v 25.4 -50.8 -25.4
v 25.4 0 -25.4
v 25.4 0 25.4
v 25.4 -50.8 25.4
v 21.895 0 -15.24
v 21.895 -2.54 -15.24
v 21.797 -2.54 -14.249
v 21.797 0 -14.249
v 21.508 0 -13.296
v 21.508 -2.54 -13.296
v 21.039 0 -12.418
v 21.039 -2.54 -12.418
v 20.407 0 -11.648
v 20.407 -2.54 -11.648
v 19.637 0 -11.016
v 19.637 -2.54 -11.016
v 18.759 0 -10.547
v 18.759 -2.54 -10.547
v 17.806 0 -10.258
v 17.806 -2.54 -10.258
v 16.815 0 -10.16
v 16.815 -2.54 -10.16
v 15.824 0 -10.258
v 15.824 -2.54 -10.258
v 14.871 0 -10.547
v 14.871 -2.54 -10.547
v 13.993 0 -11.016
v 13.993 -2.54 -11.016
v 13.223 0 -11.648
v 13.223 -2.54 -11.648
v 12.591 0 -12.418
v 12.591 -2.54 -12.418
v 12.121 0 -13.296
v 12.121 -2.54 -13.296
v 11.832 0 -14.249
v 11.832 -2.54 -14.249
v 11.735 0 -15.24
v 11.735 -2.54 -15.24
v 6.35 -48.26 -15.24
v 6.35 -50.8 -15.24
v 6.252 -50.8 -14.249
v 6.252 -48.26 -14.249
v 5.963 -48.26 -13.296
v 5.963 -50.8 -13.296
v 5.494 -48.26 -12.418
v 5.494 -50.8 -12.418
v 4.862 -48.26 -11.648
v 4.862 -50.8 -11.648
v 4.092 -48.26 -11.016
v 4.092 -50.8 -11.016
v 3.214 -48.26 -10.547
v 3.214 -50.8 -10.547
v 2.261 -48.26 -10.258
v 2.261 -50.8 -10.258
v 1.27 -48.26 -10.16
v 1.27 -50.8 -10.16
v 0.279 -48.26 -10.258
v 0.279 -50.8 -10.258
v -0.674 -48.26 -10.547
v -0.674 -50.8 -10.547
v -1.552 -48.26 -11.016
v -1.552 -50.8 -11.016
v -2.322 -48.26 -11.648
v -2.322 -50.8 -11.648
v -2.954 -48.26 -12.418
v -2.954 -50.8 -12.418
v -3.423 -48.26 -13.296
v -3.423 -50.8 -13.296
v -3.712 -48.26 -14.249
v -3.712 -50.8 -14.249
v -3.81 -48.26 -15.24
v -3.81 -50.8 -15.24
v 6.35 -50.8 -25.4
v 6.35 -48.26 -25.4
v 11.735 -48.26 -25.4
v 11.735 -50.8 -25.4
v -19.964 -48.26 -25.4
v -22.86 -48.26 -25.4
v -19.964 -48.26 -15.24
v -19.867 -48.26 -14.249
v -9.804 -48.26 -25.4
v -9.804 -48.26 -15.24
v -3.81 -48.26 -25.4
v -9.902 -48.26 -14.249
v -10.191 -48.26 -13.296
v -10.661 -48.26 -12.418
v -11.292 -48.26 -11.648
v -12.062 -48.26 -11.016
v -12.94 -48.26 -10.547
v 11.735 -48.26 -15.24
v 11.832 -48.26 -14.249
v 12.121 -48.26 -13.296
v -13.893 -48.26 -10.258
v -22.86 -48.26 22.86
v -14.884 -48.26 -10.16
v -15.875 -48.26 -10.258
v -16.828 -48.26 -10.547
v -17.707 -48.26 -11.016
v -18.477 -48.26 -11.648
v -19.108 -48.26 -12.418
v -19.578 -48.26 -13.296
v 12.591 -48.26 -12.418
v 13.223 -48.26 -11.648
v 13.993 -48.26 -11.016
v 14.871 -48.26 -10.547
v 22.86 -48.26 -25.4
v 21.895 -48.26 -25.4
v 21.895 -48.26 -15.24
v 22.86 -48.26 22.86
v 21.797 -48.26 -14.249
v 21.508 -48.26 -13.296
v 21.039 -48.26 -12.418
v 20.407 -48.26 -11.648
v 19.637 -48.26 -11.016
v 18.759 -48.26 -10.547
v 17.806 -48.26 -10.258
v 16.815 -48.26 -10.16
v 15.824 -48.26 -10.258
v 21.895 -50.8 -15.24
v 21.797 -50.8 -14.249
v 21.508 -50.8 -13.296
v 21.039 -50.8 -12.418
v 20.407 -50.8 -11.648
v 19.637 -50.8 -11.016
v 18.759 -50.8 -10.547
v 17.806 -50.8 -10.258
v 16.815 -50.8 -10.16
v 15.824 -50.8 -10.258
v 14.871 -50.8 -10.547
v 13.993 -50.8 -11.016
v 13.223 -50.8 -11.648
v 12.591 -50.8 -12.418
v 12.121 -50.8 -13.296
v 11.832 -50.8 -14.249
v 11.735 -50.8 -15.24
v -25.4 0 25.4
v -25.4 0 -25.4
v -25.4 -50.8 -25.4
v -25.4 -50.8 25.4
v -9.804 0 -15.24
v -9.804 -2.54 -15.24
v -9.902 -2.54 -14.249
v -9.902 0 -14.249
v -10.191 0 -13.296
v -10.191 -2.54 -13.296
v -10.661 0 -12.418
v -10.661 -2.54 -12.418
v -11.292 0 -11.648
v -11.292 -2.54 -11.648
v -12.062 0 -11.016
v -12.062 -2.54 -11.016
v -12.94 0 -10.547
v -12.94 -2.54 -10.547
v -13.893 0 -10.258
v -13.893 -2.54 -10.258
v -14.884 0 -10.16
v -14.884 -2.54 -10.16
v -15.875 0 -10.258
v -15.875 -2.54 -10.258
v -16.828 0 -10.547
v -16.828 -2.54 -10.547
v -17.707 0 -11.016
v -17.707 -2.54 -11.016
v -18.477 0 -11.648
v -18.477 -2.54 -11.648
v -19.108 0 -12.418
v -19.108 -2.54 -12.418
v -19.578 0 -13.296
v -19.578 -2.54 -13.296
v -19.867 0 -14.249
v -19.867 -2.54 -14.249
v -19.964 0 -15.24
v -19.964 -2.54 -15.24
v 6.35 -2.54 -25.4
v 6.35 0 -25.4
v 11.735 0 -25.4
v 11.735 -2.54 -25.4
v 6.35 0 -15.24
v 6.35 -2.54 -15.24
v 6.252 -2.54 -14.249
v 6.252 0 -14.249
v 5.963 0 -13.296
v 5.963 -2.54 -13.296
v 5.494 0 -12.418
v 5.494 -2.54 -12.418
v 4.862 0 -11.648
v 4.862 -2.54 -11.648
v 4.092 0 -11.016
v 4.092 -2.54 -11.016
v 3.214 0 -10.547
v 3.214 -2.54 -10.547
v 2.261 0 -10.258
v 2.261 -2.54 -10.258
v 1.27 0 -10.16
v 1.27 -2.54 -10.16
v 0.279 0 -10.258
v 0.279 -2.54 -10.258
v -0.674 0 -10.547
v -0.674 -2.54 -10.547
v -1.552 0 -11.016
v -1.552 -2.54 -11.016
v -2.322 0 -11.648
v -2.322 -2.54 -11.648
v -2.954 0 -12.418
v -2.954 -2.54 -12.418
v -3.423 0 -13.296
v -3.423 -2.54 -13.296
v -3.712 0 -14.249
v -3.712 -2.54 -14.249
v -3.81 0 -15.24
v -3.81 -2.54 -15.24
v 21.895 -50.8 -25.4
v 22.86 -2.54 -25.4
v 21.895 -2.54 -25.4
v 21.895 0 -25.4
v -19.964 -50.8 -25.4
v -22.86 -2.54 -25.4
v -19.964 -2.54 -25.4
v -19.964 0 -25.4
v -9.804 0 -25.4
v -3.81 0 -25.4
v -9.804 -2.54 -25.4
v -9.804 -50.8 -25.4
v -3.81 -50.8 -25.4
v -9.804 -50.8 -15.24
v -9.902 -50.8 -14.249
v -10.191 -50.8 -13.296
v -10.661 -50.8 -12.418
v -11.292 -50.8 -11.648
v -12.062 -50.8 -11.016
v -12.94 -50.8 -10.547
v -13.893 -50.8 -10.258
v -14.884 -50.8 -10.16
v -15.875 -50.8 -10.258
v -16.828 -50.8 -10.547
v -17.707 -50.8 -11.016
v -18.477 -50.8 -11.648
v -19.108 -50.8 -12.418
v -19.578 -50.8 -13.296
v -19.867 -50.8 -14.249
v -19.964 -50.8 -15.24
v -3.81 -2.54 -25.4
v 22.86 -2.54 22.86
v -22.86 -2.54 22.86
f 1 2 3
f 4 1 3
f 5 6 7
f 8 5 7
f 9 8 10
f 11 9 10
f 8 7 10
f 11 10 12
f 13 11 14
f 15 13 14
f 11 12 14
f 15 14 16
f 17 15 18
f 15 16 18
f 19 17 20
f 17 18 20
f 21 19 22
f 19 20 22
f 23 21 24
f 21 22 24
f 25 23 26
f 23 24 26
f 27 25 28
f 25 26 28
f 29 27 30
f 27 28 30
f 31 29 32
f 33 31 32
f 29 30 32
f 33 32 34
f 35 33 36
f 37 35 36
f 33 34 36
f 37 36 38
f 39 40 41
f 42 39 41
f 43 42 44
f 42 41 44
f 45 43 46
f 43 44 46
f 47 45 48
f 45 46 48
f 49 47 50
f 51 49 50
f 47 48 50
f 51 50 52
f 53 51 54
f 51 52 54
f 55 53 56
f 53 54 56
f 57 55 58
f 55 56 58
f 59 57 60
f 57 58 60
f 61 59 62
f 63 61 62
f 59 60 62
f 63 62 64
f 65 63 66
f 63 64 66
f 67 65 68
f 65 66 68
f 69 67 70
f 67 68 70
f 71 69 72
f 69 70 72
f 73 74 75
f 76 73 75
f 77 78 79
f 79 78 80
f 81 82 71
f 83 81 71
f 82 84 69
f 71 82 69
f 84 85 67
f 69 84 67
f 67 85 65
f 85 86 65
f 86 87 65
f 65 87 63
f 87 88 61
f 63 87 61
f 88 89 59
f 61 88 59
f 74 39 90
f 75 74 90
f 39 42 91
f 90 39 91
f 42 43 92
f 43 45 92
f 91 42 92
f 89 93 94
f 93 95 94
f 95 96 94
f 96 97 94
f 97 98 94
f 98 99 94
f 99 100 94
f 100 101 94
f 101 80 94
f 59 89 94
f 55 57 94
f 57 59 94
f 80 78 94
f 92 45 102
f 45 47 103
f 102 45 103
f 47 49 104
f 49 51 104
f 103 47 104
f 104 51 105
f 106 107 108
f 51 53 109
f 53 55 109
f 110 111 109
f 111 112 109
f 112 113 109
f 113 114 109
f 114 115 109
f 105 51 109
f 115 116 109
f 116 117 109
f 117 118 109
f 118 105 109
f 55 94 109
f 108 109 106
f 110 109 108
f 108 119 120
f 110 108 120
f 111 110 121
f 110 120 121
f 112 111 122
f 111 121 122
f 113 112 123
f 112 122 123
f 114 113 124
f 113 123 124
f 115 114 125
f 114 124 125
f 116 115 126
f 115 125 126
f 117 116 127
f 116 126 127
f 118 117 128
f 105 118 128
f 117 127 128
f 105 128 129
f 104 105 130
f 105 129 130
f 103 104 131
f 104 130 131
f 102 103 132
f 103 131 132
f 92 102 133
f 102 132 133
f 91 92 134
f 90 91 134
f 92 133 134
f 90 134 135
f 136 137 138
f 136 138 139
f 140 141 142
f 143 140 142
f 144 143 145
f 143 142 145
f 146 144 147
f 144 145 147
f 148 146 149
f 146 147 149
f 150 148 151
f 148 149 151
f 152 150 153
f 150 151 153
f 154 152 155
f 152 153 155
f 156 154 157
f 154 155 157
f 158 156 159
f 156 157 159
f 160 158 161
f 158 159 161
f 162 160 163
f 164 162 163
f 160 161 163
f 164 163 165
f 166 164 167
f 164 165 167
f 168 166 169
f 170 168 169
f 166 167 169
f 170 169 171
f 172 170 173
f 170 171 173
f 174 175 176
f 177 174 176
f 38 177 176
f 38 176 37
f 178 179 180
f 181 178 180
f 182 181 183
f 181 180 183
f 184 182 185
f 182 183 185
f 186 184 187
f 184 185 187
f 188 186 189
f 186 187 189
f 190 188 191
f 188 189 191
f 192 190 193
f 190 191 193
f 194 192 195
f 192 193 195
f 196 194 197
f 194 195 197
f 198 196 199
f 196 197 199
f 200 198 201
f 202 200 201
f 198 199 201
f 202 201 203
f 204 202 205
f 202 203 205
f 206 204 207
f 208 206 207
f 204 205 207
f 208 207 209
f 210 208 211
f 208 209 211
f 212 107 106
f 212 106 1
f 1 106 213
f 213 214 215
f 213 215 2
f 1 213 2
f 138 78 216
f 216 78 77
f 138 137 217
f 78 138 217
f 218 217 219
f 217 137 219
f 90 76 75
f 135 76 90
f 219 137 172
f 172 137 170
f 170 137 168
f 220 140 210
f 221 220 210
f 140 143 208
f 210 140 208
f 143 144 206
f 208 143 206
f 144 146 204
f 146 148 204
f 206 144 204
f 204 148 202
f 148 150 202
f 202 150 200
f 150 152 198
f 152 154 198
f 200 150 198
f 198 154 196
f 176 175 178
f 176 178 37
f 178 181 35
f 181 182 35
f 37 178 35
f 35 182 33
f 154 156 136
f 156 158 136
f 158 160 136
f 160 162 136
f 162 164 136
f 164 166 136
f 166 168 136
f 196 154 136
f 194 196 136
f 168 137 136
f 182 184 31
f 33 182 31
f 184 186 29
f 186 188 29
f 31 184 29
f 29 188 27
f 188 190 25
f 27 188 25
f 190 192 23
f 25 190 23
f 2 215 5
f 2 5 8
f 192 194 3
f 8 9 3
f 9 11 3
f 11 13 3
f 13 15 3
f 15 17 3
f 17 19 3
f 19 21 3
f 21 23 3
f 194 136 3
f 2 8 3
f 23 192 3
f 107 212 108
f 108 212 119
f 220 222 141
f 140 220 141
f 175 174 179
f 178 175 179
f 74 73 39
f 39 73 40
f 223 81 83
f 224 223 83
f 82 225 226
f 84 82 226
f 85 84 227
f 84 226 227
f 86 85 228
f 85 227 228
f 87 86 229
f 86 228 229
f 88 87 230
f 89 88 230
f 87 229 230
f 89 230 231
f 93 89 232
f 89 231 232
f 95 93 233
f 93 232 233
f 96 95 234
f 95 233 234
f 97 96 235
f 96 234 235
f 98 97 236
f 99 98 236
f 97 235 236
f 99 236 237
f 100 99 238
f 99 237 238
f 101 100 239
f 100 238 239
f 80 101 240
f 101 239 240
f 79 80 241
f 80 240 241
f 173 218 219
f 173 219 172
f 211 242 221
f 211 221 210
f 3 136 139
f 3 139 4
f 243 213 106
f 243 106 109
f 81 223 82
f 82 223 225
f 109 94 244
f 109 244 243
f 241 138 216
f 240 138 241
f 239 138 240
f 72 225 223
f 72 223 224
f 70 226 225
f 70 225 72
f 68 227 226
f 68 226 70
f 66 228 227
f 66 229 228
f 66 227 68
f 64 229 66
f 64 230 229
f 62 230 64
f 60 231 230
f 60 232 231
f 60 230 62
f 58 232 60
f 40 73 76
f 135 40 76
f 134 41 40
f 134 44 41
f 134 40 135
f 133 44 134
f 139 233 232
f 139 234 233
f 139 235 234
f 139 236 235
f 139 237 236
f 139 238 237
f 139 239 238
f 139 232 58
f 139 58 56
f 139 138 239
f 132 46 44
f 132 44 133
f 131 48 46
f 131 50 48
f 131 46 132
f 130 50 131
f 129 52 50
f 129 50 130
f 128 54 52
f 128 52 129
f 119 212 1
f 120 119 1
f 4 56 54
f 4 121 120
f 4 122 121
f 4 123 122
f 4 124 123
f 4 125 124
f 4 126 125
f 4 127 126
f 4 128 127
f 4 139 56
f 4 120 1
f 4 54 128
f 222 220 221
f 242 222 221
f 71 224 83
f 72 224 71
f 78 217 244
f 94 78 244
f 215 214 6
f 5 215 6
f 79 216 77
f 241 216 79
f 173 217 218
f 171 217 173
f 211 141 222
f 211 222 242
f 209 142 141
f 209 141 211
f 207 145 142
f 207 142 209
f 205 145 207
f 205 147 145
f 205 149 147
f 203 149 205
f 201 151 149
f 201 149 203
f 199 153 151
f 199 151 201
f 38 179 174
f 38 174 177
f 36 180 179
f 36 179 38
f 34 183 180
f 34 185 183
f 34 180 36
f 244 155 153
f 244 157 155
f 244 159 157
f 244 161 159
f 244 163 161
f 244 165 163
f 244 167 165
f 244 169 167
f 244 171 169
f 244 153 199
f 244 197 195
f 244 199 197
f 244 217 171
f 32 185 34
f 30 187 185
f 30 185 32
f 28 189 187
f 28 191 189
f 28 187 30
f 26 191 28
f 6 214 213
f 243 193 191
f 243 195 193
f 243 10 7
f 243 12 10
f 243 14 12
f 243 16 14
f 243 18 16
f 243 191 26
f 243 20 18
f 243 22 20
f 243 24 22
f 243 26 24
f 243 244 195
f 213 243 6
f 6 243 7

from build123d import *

# Parameters (mm, degrees)
F0_W     = 50.8
F0_H     = 50.8
F1_DEPTH = 50.8
F2_T     = -2.54
F3_W     = 10.16
F3_H     = 10.16
F4_DEPTH = 50.8


with BuildPart() as f1:
    # F0 (on Front) → F1 (new body)
    with BuildSketch(Plane.XZ):
        Rectangle(F0_W, F0_H)
    extrude(amount=F1_DEPTH)

    # F2
    f2_openings = [f1.faces().sort_by_distance(p)[0] for p in [
        (0, -25.4, -25.4),
    ]]
    offset(amount=F2_T, openings=f2_openings)

    # F3 (on face) → F4 (cut)
    with BuildSketch(Plane.XZ.offset(50.8)):
        with Locations((-14.884399, -20.32)):
            Rectangle(F3_W, F3_H)
        with BuildLine():
            ThreePointArc((-9.804399, -15.24), (-14.884399, -10.16), (-19.964399, -15.24))
            Line((-19.964399, -15.24), (-9.804399, -15.24))
        make_face()
        with Locations((1.270002, -20.32)):
            Rectangle(F3_W, F3_H)
        with BuildLine():
            ThreePointArc((6.350002, -15.24), (1.270002, -10.16), (-3.809998, -15.24))
            Line((-3.809998, -15.24), (6.350002, -15.24))
        make_face()
        with Locations((16.8148, -20.32)):
            Rectangle(F3_W, F3_H)
        with BuildLine():
            ThreePointArc((21.8948, -15.24), (16.8148, -10.16), (11.7348, -15.24))
            Line((11.7348, -15.24), (21.8948, -15.24))
        make_face()
    extrude(amount=-F4_DEPTH, mode=Mode.SUBTRACT)


solid = f1.part
